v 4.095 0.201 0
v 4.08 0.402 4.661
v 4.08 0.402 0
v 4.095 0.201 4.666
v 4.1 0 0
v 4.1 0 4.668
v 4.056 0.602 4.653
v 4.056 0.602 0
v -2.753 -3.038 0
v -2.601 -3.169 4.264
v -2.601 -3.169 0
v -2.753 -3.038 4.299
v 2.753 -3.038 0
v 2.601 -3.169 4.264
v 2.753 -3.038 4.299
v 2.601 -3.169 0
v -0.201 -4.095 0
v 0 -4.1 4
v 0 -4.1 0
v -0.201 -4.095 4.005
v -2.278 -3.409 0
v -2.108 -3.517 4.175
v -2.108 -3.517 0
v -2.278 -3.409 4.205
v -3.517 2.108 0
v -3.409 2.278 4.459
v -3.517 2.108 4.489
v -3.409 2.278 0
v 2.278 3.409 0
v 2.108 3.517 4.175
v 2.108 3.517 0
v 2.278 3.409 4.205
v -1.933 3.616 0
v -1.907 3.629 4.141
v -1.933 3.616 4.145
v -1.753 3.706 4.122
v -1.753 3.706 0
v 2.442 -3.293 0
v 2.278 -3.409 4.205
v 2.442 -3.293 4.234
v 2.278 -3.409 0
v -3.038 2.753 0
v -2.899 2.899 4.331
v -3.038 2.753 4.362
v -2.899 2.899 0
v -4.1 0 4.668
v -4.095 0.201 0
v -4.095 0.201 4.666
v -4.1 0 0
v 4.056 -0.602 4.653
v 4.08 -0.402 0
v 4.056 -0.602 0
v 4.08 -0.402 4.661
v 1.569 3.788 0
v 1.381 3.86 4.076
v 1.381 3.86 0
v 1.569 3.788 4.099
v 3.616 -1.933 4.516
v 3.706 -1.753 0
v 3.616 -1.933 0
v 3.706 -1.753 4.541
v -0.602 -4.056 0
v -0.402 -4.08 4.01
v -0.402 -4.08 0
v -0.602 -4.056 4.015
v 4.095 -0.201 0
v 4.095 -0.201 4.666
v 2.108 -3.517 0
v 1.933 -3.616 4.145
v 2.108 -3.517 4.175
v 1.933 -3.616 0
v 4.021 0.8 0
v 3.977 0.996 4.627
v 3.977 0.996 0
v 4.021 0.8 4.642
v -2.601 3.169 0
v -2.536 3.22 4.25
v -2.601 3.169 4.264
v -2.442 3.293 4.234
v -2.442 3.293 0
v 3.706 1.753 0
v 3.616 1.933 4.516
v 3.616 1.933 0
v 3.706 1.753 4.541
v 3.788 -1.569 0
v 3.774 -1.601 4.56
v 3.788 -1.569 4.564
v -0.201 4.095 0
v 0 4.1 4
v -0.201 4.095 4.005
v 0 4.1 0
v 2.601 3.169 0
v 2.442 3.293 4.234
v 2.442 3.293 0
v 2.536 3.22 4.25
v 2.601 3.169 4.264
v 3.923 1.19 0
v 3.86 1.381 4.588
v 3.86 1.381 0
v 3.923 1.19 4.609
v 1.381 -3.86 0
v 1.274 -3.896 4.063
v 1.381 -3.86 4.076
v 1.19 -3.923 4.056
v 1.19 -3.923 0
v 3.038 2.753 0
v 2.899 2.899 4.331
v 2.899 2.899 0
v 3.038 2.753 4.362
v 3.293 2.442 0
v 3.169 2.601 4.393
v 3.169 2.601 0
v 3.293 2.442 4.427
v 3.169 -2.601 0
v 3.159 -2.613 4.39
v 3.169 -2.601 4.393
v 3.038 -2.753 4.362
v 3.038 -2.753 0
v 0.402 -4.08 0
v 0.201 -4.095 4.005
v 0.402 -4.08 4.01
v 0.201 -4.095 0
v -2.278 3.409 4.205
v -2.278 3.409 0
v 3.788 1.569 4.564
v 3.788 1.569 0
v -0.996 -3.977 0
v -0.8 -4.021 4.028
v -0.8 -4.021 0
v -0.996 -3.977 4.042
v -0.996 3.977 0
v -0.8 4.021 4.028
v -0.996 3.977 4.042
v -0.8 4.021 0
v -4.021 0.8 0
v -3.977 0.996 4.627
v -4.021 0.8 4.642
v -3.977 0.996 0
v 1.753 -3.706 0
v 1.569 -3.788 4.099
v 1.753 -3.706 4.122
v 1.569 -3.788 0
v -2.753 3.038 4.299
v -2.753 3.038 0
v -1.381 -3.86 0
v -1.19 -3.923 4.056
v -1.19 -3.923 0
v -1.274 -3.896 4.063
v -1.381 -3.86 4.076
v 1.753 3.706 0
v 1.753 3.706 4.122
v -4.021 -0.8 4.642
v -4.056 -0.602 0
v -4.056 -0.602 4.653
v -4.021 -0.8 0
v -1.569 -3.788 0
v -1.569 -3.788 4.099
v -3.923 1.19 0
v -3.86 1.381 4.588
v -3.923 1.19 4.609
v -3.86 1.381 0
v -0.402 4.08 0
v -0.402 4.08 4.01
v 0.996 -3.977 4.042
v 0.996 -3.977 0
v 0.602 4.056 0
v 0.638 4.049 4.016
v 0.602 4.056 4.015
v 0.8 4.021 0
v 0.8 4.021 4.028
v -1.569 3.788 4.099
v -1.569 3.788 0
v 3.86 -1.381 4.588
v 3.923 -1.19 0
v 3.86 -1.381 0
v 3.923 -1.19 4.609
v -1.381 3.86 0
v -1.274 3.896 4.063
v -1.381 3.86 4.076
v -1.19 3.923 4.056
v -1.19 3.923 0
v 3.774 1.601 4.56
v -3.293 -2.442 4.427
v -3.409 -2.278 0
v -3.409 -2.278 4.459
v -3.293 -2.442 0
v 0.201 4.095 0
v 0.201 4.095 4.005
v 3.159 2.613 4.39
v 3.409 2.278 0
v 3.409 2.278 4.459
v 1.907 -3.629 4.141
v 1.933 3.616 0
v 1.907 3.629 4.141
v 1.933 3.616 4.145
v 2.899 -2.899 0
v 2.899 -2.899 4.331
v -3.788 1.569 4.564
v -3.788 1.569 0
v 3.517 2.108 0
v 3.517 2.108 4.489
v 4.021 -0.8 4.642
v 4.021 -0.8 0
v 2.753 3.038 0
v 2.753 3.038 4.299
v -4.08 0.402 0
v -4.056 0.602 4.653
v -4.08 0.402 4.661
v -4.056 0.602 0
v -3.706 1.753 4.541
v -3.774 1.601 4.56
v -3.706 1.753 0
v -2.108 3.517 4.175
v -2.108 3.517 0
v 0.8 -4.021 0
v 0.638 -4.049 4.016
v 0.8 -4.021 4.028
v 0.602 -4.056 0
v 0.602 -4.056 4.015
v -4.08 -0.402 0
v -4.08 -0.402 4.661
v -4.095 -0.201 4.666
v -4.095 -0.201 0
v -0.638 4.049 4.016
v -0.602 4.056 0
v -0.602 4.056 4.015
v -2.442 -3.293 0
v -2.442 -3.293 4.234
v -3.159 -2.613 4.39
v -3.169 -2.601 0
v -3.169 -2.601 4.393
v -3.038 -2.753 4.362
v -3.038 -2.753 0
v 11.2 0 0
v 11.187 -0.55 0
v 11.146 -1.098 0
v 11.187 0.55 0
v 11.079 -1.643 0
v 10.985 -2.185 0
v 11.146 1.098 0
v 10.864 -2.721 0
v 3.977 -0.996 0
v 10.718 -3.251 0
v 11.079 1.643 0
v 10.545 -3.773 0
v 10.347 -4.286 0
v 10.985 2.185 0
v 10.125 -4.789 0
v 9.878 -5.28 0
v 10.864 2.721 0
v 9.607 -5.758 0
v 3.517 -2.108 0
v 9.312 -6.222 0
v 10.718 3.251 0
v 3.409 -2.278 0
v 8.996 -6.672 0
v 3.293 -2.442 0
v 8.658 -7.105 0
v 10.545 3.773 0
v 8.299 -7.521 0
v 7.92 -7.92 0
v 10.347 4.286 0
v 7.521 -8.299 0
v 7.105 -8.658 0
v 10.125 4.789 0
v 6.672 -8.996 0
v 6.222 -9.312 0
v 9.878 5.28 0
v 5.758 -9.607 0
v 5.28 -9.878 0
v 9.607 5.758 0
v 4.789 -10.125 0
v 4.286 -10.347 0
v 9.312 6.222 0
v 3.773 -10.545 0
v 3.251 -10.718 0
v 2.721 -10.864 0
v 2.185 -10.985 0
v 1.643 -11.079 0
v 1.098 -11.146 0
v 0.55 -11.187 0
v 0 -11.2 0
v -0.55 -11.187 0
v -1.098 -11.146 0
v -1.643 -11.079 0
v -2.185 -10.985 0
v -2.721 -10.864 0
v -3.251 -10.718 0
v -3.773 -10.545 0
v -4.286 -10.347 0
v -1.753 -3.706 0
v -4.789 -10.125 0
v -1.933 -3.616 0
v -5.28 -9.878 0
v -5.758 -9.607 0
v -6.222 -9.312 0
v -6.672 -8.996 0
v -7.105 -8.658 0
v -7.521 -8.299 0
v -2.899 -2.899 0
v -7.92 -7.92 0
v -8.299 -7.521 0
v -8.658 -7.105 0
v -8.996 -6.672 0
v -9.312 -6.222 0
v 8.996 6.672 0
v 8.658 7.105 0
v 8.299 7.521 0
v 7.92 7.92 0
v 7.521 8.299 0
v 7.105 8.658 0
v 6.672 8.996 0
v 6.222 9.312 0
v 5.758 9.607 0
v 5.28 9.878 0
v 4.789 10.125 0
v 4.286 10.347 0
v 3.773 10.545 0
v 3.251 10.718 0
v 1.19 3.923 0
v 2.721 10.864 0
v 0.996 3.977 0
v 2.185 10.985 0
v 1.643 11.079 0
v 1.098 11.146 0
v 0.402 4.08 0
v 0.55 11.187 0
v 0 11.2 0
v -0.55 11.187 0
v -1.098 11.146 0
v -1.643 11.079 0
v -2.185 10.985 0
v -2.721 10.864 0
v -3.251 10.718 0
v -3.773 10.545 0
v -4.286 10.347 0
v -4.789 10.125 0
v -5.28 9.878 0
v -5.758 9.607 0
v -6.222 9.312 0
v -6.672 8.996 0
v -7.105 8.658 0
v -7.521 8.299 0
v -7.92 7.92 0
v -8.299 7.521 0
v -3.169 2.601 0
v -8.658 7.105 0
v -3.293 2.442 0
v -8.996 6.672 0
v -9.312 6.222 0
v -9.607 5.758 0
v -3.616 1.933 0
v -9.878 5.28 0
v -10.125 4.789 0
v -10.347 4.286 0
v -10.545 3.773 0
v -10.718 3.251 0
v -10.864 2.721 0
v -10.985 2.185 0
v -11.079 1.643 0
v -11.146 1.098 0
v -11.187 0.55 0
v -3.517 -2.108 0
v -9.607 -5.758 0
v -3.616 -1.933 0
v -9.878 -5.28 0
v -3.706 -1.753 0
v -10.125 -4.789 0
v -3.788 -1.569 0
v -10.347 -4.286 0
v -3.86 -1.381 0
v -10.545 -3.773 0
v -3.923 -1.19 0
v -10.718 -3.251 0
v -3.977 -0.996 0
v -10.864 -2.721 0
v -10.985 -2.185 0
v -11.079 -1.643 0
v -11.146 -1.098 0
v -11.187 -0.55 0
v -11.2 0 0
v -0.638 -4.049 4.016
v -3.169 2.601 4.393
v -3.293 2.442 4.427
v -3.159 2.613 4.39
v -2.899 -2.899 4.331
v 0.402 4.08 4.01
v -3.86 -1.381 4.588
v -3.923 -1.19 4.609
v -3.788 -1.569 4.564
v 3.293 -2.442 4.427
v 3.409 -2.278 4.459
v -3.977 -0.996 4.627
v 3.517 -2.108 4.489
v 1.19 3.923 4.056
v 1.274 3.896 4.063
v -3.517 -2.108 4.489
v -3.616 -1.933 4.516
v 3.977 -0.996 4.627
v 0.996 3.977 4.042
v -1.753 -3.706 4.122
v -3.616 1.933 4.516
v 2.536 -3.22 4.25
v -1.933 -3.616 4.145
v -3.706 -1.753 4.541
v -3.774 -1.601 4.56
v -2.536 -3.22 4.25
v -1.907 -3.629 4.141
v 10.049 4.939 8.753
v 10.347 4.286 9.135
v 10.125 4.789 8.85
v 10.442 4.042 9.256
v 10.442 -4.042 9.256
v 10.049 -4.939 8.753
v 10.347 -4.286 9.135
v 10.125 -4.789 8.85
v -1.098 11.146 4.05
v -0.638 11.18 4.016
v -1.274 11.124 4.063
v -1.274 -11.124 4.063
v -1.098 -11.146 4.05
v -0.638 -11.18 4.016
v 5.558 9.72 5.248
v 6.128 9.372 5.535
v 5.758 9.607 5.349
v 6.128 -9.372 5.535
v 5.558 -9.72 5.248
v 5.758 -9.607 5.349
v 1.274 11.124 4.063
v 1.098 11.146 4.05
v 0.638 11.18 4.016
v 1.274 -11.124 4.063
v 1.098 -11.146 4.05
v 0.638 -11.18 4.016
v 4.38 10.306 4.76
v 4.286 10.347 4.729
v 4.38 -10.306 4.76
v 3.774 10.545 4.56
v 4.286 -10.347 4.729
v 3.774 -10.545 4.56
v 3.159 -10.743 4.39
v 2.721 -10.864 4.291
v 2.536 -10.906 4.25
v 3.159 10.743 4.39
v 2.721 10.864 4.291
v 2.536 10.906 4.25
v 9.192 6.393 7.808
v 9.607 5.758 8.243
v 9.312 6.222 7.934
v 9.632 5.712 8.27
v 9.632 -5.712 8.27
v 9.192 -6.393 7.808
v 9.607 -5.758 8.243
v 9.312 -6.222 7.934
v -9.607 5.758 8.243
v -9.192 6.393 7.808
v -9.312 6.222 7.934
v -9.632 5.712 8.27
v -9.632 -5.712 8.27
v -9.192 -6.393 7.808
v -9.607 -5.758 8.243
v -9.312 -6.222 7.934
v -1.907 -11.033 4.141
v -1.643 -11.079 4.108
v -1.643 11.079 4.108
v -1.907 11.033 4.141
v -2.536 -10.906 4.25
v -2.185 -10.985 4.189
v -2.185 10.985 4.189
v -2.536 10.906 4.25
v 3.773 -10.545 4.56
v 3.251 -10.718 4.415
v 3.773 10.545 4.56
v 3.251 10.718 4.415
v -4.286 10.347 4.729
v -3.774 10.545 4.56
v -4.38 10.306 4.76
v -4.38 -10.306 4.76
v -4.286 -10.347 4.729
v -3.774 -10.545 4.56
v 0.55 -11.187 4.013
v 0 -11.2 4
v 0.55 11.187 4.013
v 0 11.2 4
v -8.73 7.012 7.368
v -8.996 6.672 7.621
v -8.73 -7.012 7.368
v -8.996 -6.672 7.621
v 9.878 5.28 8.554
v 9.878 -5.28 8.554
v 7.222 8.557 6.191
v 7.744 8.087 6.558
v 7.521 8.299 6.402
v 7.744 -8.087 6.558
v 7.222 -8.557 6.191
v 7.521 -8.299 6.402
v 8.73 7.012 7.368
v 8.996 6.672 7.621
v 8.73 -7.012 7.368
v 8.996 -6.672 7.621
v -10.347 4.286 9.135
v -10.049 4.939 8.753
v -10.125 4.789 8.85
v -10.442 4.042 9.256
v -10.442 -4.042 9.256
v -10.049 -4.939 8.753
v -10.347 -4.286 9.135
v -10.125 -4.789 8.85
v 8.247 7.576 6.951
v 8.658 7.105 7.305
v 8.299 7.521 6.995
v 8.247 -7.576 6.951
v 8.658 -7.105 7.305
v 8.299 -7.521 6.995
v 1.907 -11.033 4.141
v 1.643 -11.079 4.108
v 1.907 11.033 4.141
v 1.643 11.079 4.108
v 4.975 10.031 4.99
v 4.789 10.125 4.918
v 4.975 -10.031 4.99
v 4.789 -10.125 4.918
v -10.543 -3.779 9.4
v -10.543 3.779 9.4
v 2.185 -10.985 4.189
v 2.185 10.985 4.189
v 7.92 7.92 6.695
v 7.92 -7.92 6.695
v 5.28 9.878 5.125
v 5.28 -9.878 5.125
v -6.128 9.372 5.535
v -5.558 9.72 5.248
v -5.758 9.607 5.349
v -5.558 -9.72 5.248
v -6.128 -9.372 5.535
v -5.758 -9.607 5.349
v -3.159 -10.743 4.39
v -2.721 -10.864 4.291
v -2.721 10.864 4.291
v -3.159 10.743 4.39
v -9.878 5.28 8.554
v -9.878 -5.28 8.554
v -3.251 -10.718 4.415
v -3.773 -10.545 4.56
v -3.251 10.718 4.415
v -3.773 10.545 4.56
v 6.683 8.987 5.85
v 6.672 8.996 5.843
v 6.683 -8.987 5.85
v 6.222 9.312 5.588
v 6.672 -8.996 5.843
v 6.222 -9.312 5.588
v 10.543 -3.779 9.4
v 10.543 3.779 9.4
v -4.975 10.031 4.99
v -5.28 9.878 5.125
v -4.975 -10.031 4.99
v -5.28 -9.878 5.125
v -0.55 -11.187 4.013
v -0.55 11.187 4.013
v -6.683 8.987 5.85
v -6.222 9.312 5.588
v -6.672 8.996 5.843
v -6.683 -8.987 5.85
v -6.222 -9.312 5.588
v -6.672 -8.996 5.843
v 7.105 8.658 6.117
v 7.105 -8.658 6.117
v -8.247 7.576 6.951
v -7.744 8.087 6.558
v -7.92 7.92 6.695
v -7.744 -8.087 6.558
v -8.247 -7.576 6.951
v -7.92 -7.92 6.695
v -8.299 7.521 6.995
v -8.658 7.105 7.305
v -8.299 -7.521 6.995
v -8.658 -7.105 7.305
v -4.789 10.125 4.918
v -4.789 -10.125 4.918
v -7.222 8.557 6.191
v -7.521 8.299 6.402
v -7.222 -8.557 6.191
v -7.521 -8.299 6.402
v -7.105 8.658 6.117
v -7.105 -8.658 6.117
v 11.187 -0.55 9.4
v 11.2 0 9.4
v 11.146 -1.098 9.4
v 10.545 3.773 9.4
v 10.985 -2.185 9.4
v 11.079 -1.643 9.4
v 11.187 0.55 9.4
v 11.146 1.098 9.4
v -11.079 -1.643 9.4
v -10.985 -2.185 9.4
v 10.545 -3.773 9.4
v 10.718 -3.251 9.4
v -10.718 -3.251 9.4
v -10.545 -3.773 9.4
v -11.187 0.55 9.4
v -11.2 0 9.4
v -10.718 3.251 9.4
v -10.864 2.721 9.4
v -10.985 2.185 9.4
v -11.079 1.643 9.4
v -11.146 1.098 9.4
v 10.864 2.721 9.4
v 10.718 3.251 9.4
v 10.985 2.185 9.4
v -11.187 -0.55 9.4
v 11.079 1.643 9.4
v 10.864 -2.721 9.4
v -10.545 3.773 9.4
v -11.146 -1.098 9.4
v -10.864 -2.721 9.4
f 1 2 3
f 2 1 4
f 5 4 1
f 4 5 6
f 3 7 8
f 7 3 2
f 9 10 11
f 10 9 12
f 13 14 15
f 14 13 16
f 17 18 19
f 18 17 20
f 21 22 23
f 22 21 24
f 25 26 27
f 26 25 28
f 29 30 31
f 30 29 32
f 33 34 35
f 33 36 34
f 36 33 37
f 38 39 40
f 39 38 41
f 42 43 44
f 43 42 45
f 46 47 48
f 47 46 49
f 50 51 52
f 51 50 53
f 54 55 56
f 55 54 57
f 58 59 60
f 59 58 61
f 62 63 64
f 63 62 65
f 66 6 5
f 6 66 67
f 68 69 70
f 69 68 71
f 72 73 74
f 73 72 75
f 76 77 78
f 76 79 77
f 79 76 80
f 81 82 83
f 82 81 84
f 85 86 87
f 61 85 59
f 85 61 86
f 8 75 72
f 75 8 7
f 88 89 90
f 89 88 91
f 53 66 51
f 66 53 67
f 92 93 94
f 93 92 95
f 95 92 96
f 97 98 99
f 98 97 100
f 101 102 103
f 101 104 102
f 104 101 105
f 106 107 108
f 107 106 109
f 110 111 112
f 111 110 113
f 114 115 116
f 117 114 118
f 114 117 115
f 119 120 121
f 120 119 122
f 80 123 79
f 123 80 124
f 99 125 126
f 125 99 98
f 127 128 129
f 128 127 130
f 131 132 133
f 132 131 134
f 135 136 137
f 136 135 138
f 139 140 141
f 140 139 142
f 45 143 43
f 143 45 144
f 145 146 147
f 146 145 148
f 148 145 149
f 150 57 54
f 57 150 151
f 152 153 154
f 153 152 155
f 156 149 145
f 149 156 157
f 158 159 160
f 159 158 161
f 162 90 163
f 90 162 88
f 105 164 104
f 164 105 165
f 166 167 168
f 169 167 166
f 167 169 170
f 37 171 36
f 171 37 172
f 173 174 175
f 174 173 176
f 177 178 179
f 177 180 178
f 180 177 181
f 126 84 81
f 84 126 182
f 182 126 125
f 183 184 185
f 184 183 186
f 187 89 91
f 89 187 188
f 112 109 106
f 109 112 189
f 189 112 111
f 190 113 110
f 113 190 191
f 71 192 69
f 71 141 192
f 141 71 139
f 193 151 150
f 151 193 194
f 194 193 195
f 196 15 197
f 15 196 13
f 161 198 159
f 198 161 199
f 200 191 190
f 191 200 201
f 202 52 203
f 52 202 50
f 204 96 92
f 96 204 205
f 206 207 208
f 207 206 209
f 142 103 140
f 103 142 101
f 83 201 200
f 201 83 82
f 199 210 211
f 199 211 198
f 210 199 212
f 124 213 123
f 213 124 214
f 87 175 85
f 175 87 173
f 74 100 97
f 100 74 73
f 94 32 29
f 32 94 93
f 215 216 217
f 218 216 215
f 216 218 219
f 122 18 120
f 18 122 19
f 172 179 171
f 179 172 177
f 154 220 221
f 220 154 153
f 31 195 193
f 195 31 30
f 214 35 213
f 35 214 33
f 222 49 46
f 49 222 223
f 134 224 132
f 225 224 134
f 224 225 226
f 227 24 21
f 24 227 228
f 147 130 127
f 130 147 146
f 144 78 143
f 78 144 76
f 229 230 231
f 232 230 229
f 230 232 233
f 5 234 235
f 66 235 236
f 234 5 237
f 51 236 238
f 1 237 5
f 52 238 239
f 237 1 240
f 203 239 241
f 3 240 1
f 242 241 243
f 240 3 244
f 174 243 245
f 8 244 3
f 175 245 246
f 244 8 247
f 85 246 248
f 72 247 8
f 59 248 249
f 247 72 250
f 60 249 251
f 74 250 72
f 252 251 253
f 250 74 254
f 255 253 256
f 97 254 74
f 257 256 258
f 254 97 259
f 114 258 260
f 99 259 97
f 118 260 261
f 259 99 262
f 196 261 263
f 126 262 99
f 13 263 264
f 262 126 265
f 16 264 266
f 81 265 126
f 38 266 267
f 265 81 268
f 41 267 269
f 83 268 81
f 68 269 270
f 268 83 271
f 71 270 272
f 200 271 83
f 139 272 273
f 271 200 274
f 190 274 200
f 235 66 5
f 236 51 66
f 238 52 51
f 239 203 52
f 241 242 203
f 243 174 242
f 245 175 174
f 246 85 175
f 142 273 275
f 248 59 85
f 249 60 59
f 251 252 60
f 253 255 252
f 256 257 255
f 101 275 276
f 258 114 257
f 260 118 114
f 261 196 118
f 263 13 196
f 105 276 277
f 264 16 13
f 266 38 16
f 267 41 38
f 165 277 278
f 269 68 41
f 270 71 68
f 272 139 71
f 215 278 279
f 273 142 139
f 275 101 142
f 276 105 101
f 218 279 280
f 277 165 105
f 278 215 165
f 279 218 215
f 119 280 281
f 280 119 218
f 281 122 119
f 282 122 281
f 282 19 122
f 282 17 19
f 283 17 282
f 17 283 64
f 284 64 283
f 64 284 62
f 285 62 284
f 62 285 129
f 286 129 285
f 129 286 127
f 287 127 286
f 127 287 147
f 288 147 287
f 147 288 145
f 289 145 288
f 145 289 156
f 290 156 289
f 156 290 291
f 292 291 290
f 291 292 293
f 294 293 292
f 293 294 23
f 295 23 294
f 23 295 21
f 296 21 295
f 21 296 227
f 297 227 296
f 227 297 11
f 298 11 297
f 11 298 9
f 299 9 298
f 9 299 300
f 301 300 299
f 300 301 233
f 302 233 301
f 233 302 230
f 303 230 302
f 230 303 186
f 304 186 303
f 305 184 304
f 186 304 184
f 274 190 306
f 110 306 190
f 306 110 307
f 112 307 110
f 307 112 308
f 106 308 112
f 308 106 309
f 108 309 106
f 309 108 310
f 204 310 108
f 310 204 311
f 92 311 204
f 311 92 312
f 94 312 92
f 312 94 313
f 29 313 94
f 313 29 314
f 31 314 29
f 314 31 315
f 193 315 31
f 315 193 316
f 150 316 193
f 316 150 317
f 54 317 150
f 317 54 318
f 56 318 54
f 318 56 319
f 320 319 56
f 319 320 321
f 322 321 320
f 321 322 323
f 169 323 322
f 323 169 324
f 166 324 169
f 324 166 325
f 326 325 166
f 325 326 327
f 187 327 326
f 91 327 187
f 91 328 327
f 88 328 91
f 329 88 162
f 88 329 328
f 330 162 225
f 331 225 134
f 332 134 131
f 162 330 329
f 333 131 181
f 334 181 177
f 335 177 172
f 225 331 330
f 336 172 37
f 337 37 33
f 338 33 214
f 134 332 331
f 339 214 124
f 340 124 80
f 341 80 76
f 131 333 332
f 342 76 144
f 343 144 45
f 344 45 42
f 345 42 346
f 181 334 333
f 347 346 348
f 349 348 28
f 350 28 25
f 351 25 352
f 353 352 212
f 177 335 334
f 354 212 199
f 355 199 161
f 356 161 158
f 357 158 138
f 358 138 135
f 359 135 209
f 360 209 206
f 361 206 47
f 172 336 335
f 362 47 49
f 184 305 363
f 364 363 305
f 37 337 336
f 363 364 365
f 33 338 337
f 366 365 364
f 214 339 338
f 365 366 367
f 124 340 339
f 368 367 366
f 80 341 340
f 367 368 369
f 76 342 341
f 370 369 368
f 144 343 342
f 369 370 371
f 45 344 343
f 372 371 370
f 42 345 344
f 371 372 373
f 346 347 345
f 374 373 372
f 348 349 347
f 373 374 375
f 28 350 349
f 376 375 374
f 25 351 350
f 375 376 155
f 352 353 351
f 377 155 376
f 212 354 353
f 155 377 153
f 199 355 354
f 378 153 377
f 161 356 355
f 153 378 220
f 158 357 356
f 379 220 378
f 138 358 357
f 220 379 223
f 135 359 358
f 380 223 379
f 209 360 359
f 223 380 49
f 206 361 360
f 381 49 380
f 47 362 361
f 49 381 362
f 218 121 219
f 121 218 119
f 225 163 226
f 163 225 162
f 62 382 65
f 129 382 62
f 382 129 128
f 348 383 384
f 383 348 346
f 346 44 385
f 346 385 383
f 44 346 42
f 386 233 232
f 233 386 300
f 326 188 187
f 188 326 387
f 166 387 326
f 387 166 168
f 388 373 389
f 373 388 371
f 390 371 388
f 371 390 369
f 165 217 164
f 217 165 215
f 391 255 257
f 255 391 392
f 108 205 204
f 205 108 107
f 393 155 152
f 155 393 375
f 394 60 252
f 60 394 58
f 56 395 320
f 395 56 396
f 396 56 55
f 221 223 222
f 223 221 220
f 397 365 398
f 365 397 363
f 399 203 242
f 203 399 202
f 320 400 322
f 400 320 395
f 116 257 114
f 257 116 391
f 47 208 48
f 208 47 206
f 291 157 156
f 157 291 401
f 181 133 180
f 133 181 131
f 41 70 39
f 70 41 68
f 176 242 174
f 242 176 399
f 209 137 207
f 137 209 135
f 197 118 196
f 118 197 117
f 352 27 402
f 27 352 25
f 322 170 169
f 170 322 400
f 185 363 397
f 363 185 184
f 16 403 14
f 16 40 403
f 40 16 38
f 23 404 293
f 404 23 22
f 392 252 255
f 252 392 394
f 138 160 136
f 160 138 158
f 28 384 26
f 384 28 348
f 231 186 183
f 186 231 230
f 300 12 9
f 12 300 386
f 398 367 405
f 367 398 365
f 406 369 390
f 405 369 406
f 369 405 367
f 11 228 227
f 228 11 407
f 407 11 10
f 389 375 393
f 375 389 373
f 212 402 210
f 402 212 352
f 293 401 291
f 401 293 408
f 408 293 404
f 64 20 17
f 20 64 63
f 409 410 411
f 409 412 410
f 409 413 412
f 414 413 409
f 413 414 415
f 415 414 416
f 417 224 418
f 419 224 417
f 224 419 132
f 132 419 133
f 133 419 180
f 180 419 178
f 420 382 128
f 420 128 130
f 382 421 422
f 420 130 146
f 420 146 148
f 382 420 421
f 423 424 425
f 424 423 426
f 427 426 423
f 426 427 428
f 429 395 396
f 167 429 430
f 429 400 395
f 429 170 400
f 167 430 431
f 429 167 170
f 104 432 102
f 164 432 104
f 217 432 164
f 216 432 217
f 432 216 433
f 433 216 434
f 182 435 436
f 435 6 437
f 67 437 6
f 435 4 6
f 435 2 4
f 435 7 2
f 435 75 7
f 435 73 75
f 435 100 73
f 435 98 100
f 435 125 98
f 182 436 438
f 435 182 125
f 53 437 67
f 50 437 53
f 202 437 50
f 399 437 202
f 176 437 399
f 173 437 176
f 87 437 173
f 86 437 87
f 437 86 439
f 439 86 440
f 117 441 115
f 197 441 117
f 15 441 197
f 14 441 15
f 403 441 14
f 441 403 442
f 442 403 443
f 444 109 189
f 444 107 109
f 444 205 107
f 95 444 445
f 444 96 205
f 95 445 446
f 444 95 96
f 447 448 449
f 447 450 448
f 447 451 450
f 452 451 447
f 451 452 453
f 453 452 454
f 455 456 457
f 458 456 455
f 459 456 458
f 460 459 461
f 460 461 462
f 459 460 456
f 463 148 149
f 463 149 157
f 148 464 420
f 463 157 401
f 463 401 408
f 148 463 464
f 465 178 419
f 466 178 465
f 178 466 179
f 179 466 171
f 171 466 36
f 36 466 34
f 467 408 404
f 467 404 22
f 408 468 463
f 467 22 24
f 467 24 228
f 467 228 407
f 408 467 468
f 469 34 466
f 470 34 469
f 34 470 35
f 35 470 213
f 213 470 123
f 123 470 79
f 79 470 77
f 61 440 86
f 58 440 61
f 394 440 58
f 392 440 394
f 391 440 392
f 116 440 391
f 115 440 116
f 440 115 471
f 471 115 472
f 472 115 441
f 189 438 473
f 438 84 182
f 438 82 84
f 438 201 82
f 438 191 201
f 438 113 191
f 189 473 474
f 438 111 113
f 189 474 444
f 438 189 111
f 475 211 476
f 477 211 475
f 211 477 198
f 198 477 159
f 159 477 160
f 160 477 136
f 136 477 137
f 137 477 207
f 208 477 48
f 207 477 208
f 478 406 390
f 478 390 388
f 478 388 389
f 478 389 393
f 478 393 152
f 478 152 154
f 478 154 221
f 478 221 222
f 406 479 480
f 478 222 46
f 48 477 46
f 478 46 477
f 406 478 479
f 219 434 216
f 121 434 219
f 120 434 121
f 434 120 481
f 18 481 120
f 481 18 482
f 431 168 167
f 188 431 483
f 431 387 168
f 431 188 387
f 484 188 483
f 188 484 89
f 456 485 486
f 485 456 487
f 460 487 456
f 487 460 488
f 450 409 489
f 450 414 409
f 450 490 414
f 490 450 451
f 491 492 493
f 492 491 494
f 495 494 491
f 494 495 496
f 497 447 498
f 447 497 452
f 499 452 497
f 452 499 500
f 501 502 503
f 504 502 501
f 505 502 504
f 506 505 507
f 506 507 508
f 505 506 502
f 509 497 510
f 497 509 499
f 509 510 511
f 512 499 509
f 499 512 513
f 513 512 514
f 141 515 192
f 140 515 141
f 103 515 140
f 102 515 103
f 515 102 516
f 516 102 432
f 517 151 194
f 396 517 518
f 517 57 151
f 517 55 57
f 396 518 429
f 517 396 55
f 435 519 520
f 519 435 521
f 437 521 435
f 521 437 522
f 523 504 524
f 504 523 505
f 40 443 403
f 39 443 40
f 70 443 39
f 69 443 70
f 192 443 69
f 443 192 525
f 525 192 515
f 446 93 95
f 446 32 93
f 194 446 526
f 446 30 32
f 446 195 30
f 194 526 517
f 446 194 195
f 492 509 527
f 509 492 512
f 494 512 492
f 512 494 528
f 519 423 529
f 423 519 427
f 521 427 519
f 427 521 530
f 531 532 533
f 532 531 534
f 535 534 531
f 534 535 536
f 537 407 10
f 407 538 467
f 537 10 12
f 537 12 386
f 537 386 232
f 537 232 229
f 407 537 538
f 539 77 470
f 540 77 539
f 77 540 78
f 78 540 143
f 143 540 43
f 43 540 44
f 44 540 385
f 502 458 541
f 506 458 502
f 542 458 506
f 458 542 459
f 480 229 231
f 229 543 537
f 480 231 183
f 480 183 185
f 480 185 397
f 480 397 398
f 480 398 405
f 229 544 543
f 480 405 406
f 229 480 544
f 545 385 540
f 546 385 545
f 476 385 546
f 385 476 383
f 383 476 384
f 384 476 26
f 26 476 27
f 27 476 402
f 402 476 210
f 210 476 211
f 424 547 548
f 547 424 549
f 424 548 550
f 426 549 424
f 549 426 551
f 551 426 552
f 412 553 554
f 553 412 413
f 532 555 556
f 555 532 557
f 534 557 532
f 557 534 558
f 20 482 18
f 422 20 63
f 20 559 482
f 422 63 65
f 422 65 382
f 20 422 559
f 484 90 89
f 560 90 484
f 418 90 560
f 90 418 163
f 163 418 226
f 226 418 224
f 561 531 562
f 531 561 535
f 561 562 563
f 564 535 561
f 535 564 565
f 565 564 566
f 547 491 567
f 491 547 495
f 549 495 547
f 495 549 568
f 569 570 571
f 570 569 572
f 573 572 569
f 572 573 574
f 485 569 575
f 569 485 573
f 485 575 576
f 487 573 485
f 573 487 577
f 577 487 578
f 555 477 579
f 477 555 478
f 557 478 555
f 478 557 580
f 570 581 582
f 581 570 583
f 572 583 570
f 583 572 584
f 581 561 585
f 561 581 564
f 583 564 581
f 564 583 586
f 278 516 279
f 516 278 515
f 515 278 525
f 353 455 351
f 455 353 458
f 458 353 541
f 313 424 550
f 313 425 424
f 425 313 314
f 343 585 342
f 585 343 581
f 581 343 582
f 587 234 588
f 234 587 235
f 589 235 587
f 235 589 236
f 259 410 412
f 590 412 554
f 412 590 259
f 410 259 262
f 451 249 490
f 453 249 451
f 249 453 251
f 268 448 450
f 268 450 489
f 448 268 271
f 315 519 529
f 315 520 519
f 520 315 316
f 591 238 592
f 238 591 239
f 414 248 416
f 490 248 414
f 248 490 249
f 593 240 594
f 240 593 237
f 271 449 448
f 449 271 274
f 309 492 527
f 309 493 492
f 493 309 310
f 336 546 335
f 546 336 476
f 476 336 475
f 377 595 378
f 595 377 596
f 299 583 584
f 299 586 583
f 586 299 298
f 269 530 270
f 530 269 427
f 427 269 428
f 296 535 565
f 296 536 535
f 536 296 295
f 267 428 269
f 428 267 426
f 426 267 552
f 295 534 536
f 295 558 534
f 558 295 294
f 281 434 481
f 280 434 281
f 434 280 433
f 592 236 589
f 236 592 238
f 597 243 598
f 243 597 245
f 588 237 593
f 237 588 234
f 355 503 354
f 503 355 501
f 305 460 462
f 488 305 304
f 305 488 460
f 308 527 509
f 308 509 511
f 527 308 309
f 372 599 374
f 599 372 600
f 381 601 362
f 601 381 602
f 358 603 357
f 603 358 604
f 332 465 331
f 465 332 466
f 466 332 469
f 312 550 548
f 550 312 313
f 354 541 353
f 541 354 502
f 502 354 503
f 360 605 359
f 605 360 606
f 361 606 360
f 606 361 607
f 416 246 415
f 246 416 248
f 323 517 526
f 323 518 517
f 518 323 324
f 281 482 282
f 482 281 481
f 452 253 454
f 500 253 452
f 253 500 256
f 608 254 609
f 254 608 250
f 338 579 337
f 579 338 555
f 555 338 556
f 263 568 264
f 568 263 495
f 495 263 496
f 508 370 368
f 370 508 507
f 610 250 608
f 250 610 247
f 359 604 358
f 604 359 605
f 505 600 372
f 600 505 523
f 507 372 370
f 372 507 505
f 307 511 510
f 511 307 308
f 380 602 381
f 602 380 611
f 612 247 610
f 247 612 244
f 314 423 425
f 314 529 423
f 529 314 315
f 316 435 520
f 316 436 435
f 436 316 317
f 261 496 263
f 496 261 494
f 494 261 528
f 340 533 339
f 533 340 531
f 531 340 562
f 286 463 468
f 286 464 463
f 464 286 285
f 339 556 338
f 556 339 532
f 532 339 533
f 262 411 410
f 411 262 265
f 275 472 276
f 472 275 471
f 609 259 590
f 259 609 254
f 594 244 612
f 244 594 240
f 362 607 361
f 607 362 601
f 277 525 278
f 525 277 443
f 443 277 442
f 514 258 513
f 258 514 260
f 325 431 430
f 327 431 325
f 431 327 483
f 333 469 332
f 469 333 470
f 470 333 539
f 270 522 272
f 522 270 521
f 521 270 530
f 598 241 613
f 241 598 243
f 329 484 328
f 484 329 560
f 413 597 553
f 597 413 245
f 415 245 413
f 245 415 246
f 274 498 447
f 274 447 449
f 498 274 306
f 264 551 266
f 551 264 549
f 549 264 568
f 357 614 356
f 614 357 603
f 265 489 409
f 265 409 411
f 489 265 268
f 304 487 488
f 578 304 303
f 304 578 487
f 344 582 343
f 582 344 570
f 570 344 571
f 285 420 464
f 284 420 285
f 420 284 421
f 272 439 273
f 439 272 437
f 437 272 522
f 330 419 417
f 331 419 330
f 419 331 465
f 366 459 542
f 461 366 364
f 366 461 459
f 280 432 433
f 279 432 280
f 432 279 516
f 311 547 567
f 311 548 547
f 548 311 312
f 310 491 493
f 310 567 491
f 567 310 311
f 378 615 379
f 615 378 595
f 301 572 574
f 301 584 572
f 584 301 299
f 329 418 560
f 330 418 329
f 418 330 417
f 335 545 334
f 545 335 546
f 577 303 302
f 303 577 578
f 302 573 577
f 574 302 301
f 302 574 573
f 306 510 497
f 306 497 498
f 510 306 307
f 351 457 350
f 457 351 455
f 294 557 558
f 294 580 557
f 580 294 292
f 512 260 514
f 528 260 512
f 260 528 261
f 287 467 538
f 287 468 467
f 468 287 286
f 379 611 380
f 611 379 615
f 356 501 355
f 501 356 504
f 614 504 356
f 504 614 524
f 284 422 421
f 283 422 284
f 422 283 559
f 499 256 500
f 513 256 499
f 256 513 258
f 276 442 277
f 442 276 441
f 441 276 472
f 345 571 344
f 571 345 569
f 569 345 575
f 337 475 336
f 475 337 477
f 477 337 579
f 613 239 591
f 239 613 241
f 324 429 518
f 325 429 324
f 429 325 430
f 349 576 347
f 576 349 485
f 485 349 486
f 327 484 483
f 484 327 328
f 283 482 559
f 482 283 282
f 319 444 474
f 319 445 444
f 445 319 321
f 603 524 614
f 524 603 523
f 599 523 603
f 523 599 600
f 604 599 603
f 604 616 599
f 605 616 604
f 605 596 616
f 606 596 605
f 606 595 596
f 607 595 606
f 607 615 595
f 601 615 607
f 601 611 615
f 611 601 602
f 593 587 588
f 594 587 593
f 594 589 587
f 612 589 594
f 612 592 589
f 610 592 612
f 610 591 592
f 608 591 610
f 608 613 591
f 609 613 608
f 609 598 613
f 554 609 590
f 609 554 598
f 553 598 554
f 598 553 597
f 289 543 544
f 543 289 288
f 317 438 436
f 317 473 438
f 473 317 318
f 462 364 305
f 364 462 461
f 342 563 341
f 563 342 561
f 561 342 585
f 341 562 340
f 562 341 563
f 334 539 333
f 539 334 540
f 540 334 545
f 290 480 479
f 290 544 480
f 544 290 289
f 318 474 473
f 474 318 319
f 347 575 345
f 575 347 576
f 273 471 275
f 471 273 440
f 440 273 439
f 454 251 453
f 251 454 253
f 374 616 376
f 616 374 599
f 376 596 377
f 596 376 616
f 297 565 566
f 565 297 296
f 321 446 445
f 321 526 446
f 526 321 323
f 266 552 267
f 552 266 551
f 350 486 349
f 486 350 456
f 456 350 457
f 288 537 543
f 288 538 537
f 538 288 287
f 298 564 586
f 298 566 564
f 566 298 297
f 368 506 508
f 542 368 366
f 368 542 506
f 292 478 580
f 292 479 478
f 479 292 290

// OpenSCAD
$fn=128;

difference() {
  cylinder(h=9.4, d=22.4);
  union() {
    cylinder(h=5.6, d=8.2);
    translate([0, 11.2, 26/2+4]) rotate([90]) cylinder(h=22.4, d=26);
  }
}
